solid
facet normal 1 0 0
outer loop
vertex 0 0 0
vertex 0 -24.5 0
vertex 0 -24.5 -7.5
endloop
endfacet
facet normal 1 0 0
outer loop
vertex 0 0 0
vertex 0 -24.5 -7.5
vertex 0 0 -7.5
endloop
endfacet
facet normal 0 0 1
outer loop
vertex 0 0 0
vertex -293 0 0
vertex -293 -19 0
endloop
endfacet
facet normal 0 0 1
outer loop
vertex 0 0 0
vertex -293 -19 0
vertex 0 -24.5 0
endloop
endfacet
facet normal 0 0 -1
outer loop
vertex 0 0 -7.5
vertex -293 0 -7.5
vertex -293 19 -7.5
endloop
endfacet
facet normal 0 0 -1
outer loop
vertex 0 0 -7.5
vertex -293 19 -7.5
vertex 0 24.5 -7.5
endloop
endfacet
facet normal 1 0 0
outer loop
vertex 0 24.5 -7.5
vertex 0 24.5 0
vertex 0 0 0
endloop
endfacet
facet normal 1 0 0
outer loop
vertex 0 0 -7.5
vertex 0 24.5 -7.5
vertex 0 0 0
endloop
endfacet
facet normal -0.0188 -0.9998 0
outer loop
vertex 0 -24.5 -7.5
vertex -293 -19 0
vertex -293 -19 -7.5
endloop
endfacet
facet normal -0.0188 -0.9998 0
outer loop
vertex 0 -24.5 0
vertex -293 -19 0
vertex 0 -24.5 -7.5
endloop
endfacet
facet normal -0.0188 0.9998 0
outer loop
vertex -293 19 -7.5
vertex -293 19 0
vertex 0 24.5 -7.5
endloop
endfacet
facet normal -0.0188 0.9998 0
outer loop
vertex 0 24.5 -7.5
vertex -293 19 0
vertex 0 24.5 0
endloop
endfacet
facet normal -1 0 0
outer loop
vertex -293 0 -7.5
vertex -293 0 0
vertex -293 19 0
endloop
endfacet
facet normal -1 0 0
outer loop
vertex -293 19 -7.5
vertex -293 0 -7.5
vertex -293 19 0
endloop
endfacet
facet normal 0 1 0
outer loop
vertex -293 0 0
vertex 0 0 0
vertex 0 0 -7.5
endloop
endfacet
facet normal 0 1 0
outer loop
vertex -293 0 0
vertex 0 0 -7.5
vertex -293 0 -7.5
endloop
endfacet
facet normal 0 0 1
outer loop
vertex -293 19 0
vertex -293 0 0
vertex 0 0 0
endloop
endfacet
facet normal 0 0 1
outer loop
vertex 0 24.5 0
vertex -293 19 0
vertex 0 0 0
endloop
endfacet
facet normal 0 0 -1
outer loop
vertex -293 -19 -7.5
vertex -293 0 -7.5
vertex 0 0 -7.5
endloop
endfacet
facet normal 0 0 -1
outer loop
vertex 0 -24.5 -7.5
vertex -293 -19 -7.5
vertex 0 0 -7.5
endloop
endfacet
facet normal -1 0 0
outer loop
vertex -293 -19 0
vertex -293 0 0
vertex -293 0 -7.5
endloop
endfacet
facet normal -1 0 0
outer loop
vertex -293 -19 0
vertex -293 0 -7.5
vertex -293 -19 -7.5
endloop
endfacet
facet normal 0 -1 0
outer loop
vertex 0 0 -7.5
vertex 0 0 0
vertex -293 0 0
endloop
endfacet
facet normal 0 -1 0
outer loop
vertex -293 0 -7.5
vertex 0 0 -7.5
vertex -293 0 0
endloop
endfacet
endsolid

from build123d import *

# Parameters (mm, degrees)
F1_DEPTH = 7.5


with BuildPart() as f1:
    # F0 (on Top) → F1 (new body)
    with BuildSketch(Plane.XY):
        Polygon((0, 0), (-293, 0), (-293, -19), (0, -24.5), align=None)
    extrude(amount=-F1_DEPTH)


with BuildPart() as f2_1:
    # F2: instance of F1
    add(f1.part.mirror(Plane.XZ))


solid = Compound([f1.part, f2_1.part])
